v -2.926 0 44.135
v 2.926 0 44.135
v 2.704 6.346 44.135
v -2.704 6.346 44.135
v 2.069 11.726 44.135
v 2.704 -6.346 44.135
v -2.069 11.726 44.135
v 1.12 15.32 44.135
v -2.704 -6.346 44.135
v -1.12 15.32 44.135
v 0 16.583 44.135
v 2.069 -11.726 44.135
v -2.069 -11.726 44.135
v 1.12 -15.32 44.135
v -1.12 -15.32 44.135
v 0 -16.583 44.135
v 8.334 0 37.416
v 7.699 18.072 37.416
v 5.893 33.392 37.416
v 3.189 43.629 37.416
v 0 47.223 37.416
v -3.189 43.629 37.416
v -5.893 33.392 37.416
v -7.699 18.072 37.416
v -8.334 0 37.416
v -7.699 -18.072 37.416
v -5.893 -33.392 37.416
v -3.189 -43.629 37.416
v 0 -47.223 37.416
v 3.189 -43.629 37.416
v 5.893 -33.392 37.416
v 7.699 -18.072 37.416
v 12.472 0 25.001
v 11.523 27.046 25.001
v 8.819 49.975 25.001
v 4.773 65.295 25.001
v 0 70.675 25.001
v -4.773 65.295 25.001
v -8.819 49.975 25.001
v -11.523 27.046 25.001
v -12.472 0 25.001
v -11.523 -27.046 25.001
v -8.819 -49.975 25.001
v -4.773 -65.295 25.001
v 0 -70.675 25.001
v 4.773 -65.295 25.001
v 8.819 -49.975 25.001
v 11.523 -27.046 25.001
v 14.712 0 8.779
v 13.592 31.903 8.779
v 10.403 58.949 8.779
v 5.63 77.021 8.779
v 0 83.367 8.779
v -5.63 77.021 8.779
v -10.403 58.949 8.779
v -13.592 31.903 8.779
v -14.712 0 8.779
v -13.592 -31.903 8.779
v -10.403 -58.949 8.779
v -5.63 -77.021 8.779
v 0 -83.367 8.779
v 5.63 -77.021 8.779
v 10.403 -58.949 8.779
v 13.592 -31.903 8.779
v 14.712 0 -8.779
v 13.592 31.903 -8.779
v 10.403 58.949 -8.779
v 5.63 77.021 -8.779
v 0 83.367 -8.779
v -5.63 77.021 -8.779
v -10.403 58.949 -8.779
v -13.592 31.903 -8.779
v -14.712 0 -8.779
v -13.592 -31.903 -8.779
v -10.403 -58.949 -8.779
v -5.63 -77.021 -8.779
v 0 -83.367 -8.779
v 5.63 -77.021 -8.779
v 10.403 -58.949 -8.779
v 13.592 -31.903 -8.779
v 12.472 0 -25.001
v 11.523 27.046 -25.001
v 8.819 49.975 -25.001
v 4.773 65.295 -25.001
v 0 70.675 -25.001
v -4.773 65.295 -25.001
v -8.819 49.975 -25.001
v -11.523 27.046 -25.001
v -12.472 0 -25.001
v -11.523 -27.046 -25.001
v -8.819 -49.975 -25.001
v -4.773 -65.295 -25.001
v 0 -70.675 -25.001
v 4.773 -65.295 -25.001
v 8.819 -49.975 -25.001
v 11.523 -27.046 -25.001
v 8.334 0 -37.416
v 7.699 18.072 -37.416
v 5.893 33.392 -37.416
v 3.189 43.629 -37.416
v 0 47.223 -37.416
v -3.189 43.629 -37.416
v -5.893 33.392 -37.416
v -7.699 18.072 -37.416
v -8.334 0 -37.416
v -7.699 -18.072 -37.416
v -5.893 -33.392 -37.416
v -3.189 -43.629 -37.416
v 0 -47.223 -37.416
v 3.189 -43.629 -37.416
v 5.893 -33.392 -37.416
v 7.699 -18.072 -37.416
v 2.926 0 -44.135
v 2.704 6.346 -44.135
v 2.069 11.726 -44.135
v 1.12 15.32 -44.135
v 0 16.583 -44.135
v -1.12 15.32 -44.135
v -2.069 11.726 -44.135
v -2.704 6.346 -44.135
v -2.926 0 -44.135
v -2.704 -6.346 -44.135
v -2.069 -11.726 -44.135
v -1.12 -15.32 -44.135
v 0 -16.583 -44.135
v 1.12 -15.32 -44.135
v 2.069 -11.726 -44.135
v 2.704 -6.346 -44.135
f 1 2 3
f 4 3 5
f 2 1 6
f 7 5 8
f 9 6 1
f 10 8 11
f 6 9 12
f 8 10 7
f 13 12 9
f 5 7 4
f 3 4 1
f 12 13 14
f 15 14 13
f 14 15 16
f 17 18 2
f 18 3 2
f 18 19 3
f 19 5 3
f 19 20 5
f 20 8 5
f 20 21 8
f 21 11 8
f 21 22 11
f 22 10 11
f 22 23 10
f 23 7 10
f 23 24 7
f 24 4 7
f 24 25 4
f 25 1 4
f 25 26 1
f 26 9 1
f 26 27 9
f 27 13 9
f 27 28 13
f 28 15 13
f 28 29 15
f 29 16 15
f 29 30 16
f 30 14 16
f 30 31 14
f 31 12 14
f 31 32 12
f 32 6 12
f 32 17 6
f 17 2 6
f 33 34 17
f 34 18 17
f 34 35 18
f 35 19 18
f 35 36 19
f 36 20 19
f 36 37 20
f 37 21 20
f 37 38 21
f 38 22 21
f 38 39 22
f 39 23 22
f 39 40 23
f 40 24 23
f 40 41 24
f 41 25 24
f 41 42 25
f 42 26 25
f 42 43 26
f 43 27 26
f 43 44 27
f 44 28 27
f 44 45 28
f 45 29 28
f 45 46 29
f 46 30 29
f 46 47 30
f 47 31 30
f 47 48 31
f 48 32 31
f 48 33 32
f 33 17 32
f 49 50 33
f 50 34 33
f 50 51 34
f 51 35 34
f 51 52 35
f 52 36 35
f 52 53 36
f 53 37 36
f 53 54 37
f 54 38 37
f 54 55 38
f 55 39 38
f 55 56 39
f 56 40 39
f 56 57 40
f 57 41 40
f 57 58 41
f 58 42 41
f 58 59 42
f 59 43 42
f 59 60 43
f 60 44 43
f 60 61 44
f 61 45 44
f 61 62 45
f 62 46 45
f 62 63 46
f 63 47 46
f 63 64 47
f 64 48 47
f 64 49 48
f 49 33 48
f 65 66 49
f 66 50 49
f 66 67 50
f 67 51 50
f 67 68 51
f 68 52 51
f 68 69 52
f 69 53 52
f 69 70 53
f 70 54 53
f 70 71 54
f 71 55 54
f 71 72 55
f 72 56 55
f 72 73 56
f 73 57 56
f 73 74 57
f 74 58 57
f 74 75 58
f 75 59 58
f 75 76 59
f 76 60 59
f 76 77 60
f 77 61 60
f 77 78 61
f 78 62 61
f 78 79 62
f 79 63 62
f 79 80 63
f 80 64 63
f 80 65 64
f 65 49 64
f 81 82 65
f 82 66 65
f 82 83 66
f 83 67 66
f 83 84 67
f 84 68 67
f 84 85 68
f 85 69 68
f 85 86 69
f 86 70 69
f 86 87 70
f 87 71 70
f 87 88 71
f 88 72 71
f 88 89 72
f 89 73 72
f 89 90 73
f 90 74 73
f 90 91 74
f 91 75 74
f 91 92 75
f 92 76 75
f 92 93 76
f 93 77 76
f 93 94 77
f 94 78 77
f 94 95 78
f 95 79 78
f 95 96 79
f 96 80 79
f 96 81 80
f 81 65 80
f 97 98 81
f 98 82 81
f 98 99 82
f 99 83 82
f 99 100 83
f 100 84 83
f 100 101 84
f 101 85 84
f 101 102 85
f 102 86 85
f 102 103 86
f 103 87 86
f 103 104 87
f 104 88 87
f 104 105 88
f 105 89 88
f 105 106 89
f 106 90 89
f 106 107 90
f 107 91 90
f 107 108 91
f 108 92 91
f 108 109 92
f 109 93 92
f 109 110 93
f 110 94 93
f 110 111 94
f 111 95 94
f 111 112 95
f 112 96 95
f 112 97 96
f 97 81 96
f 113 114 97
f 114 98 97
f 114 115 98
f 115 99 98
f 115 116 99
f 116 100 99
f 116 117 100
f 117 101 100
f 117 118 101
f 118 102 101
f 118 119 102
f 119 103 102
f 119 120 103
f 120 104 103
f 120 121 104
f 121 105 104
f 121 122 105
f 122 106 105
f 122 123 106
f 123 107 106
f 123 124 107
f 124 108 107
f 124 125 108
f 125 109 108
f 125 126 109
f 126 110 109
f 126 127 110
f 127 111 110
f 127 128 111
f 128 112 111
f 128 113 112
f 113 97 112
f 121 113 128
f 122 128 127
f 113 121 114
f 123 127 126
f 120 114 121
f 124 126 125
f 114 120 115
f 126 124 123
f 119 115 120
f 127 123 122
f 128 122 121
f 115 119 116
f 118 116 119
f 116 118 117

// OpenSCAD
// Generated by SolidPython 1.0.1 on 2020-07-29 00:46:45


scale(v = [3, 17, 9]) {
	sphere(r = 5);
}
/***********************************************
*********      SolidPython code:      **********
************************************************
 
# import packages: SolidPython
from solid import *
from solid.utils import *
from itertools import chain, combinations, permutations


class Resize:

    def __init__(self, scad_file):
        self.scad_file = scad_file
        #self.scad_file = import_scad(scad_file)
        # cone/cylinder param:
        self.r1 = 0
        self.r2 = 0
        self.h = 0
        # rectangular prism param:
        self.w = 0
        self.l = 0
        # ellipse param:
        self.r = 0

    # import OpenScad code (file name corresponds to shape)


    # classify shape + parameters
    def assign(self, param1, param2, param3):
        if self.scad_file == 'cone.scad':
            self.r1 = param1
            self.r2 = param2
            self.h = param3
        elif self.scad_file == 'cylinder.scad':
            self.r1 = param1
            self.r2 = param2
            self.h = param3
        elif self.scad_file == 'rectangularPrism.scad':
            self.h = param1
            self.l = param2
            self.w = param3
        else:
            self.r = param1
            self.h = param2

    # resize parameters
    def iterate(self):
        x = range(3, 20, 2)
        i = 1
        if self.scad_file == 'cone.scad':
            tempList = list(permutations(x, 2))
            for temp in tempList:
                param1 = temp[0]
                param2 = temp[1]
                filepath = 'produced_scad_files/' + 'cone' + str(param1) + '_' + str(param2) + '_' + '.scad'
                scad_render_to_file(cylinder(h=param1, r1=param2, r2=0), filepath)

        elif self.scad_file == 'cylinder.scad':
            tempList = list(permutations(x, 3))
            for temp in tempList:
                param1 = temp[0]
                param2 = temp[1]
                filepath = 'produced_scad_files/' + 'cylinder' + str(param1) + '_' + str(param2) + '_' + '.scad'
                scad_render_to_file(cylinder(h=param1, r1=param2, r2=param2), filepath)

        elif self.scad_file == 'rectangularPrism.scad':
            tempList = list(permutations(x, 3))
            for temp in tempList:
                param1 = temp[0]
                param2 = temp[1]
                param3 = temp[2]
                filepath = 'produced_scad_files/' + 'rectangularPrism' + str(param1) + '_' + str(param2) + '_' + str(
                    param3) + '.scad'
                scad_render_to_file(cube(size=(param1, param2, param3)), filepath)

        elif self.scad_file == 'ellipse.scad':
            tempList = list(permutations(x, 4))
            for temp in tempList:
                param1 = temp[0]
                param2 = temp[1]
                param3 = temp[2]
                param4 = temp[3]
                filepath = 'produced_scad_files/' + 'ellipse' + str(param1) + '_' + str(param2) + '_' + str(param3) + '_' + str(param4) + '.scad'
                scad_render_to_file(scale([param1, param2, param3])(sphere(r=param4)), filepath)

    def render_to_scadfile(self):
        scad_render_to_file(scad, 'example.scad') 
 
************************************************/
